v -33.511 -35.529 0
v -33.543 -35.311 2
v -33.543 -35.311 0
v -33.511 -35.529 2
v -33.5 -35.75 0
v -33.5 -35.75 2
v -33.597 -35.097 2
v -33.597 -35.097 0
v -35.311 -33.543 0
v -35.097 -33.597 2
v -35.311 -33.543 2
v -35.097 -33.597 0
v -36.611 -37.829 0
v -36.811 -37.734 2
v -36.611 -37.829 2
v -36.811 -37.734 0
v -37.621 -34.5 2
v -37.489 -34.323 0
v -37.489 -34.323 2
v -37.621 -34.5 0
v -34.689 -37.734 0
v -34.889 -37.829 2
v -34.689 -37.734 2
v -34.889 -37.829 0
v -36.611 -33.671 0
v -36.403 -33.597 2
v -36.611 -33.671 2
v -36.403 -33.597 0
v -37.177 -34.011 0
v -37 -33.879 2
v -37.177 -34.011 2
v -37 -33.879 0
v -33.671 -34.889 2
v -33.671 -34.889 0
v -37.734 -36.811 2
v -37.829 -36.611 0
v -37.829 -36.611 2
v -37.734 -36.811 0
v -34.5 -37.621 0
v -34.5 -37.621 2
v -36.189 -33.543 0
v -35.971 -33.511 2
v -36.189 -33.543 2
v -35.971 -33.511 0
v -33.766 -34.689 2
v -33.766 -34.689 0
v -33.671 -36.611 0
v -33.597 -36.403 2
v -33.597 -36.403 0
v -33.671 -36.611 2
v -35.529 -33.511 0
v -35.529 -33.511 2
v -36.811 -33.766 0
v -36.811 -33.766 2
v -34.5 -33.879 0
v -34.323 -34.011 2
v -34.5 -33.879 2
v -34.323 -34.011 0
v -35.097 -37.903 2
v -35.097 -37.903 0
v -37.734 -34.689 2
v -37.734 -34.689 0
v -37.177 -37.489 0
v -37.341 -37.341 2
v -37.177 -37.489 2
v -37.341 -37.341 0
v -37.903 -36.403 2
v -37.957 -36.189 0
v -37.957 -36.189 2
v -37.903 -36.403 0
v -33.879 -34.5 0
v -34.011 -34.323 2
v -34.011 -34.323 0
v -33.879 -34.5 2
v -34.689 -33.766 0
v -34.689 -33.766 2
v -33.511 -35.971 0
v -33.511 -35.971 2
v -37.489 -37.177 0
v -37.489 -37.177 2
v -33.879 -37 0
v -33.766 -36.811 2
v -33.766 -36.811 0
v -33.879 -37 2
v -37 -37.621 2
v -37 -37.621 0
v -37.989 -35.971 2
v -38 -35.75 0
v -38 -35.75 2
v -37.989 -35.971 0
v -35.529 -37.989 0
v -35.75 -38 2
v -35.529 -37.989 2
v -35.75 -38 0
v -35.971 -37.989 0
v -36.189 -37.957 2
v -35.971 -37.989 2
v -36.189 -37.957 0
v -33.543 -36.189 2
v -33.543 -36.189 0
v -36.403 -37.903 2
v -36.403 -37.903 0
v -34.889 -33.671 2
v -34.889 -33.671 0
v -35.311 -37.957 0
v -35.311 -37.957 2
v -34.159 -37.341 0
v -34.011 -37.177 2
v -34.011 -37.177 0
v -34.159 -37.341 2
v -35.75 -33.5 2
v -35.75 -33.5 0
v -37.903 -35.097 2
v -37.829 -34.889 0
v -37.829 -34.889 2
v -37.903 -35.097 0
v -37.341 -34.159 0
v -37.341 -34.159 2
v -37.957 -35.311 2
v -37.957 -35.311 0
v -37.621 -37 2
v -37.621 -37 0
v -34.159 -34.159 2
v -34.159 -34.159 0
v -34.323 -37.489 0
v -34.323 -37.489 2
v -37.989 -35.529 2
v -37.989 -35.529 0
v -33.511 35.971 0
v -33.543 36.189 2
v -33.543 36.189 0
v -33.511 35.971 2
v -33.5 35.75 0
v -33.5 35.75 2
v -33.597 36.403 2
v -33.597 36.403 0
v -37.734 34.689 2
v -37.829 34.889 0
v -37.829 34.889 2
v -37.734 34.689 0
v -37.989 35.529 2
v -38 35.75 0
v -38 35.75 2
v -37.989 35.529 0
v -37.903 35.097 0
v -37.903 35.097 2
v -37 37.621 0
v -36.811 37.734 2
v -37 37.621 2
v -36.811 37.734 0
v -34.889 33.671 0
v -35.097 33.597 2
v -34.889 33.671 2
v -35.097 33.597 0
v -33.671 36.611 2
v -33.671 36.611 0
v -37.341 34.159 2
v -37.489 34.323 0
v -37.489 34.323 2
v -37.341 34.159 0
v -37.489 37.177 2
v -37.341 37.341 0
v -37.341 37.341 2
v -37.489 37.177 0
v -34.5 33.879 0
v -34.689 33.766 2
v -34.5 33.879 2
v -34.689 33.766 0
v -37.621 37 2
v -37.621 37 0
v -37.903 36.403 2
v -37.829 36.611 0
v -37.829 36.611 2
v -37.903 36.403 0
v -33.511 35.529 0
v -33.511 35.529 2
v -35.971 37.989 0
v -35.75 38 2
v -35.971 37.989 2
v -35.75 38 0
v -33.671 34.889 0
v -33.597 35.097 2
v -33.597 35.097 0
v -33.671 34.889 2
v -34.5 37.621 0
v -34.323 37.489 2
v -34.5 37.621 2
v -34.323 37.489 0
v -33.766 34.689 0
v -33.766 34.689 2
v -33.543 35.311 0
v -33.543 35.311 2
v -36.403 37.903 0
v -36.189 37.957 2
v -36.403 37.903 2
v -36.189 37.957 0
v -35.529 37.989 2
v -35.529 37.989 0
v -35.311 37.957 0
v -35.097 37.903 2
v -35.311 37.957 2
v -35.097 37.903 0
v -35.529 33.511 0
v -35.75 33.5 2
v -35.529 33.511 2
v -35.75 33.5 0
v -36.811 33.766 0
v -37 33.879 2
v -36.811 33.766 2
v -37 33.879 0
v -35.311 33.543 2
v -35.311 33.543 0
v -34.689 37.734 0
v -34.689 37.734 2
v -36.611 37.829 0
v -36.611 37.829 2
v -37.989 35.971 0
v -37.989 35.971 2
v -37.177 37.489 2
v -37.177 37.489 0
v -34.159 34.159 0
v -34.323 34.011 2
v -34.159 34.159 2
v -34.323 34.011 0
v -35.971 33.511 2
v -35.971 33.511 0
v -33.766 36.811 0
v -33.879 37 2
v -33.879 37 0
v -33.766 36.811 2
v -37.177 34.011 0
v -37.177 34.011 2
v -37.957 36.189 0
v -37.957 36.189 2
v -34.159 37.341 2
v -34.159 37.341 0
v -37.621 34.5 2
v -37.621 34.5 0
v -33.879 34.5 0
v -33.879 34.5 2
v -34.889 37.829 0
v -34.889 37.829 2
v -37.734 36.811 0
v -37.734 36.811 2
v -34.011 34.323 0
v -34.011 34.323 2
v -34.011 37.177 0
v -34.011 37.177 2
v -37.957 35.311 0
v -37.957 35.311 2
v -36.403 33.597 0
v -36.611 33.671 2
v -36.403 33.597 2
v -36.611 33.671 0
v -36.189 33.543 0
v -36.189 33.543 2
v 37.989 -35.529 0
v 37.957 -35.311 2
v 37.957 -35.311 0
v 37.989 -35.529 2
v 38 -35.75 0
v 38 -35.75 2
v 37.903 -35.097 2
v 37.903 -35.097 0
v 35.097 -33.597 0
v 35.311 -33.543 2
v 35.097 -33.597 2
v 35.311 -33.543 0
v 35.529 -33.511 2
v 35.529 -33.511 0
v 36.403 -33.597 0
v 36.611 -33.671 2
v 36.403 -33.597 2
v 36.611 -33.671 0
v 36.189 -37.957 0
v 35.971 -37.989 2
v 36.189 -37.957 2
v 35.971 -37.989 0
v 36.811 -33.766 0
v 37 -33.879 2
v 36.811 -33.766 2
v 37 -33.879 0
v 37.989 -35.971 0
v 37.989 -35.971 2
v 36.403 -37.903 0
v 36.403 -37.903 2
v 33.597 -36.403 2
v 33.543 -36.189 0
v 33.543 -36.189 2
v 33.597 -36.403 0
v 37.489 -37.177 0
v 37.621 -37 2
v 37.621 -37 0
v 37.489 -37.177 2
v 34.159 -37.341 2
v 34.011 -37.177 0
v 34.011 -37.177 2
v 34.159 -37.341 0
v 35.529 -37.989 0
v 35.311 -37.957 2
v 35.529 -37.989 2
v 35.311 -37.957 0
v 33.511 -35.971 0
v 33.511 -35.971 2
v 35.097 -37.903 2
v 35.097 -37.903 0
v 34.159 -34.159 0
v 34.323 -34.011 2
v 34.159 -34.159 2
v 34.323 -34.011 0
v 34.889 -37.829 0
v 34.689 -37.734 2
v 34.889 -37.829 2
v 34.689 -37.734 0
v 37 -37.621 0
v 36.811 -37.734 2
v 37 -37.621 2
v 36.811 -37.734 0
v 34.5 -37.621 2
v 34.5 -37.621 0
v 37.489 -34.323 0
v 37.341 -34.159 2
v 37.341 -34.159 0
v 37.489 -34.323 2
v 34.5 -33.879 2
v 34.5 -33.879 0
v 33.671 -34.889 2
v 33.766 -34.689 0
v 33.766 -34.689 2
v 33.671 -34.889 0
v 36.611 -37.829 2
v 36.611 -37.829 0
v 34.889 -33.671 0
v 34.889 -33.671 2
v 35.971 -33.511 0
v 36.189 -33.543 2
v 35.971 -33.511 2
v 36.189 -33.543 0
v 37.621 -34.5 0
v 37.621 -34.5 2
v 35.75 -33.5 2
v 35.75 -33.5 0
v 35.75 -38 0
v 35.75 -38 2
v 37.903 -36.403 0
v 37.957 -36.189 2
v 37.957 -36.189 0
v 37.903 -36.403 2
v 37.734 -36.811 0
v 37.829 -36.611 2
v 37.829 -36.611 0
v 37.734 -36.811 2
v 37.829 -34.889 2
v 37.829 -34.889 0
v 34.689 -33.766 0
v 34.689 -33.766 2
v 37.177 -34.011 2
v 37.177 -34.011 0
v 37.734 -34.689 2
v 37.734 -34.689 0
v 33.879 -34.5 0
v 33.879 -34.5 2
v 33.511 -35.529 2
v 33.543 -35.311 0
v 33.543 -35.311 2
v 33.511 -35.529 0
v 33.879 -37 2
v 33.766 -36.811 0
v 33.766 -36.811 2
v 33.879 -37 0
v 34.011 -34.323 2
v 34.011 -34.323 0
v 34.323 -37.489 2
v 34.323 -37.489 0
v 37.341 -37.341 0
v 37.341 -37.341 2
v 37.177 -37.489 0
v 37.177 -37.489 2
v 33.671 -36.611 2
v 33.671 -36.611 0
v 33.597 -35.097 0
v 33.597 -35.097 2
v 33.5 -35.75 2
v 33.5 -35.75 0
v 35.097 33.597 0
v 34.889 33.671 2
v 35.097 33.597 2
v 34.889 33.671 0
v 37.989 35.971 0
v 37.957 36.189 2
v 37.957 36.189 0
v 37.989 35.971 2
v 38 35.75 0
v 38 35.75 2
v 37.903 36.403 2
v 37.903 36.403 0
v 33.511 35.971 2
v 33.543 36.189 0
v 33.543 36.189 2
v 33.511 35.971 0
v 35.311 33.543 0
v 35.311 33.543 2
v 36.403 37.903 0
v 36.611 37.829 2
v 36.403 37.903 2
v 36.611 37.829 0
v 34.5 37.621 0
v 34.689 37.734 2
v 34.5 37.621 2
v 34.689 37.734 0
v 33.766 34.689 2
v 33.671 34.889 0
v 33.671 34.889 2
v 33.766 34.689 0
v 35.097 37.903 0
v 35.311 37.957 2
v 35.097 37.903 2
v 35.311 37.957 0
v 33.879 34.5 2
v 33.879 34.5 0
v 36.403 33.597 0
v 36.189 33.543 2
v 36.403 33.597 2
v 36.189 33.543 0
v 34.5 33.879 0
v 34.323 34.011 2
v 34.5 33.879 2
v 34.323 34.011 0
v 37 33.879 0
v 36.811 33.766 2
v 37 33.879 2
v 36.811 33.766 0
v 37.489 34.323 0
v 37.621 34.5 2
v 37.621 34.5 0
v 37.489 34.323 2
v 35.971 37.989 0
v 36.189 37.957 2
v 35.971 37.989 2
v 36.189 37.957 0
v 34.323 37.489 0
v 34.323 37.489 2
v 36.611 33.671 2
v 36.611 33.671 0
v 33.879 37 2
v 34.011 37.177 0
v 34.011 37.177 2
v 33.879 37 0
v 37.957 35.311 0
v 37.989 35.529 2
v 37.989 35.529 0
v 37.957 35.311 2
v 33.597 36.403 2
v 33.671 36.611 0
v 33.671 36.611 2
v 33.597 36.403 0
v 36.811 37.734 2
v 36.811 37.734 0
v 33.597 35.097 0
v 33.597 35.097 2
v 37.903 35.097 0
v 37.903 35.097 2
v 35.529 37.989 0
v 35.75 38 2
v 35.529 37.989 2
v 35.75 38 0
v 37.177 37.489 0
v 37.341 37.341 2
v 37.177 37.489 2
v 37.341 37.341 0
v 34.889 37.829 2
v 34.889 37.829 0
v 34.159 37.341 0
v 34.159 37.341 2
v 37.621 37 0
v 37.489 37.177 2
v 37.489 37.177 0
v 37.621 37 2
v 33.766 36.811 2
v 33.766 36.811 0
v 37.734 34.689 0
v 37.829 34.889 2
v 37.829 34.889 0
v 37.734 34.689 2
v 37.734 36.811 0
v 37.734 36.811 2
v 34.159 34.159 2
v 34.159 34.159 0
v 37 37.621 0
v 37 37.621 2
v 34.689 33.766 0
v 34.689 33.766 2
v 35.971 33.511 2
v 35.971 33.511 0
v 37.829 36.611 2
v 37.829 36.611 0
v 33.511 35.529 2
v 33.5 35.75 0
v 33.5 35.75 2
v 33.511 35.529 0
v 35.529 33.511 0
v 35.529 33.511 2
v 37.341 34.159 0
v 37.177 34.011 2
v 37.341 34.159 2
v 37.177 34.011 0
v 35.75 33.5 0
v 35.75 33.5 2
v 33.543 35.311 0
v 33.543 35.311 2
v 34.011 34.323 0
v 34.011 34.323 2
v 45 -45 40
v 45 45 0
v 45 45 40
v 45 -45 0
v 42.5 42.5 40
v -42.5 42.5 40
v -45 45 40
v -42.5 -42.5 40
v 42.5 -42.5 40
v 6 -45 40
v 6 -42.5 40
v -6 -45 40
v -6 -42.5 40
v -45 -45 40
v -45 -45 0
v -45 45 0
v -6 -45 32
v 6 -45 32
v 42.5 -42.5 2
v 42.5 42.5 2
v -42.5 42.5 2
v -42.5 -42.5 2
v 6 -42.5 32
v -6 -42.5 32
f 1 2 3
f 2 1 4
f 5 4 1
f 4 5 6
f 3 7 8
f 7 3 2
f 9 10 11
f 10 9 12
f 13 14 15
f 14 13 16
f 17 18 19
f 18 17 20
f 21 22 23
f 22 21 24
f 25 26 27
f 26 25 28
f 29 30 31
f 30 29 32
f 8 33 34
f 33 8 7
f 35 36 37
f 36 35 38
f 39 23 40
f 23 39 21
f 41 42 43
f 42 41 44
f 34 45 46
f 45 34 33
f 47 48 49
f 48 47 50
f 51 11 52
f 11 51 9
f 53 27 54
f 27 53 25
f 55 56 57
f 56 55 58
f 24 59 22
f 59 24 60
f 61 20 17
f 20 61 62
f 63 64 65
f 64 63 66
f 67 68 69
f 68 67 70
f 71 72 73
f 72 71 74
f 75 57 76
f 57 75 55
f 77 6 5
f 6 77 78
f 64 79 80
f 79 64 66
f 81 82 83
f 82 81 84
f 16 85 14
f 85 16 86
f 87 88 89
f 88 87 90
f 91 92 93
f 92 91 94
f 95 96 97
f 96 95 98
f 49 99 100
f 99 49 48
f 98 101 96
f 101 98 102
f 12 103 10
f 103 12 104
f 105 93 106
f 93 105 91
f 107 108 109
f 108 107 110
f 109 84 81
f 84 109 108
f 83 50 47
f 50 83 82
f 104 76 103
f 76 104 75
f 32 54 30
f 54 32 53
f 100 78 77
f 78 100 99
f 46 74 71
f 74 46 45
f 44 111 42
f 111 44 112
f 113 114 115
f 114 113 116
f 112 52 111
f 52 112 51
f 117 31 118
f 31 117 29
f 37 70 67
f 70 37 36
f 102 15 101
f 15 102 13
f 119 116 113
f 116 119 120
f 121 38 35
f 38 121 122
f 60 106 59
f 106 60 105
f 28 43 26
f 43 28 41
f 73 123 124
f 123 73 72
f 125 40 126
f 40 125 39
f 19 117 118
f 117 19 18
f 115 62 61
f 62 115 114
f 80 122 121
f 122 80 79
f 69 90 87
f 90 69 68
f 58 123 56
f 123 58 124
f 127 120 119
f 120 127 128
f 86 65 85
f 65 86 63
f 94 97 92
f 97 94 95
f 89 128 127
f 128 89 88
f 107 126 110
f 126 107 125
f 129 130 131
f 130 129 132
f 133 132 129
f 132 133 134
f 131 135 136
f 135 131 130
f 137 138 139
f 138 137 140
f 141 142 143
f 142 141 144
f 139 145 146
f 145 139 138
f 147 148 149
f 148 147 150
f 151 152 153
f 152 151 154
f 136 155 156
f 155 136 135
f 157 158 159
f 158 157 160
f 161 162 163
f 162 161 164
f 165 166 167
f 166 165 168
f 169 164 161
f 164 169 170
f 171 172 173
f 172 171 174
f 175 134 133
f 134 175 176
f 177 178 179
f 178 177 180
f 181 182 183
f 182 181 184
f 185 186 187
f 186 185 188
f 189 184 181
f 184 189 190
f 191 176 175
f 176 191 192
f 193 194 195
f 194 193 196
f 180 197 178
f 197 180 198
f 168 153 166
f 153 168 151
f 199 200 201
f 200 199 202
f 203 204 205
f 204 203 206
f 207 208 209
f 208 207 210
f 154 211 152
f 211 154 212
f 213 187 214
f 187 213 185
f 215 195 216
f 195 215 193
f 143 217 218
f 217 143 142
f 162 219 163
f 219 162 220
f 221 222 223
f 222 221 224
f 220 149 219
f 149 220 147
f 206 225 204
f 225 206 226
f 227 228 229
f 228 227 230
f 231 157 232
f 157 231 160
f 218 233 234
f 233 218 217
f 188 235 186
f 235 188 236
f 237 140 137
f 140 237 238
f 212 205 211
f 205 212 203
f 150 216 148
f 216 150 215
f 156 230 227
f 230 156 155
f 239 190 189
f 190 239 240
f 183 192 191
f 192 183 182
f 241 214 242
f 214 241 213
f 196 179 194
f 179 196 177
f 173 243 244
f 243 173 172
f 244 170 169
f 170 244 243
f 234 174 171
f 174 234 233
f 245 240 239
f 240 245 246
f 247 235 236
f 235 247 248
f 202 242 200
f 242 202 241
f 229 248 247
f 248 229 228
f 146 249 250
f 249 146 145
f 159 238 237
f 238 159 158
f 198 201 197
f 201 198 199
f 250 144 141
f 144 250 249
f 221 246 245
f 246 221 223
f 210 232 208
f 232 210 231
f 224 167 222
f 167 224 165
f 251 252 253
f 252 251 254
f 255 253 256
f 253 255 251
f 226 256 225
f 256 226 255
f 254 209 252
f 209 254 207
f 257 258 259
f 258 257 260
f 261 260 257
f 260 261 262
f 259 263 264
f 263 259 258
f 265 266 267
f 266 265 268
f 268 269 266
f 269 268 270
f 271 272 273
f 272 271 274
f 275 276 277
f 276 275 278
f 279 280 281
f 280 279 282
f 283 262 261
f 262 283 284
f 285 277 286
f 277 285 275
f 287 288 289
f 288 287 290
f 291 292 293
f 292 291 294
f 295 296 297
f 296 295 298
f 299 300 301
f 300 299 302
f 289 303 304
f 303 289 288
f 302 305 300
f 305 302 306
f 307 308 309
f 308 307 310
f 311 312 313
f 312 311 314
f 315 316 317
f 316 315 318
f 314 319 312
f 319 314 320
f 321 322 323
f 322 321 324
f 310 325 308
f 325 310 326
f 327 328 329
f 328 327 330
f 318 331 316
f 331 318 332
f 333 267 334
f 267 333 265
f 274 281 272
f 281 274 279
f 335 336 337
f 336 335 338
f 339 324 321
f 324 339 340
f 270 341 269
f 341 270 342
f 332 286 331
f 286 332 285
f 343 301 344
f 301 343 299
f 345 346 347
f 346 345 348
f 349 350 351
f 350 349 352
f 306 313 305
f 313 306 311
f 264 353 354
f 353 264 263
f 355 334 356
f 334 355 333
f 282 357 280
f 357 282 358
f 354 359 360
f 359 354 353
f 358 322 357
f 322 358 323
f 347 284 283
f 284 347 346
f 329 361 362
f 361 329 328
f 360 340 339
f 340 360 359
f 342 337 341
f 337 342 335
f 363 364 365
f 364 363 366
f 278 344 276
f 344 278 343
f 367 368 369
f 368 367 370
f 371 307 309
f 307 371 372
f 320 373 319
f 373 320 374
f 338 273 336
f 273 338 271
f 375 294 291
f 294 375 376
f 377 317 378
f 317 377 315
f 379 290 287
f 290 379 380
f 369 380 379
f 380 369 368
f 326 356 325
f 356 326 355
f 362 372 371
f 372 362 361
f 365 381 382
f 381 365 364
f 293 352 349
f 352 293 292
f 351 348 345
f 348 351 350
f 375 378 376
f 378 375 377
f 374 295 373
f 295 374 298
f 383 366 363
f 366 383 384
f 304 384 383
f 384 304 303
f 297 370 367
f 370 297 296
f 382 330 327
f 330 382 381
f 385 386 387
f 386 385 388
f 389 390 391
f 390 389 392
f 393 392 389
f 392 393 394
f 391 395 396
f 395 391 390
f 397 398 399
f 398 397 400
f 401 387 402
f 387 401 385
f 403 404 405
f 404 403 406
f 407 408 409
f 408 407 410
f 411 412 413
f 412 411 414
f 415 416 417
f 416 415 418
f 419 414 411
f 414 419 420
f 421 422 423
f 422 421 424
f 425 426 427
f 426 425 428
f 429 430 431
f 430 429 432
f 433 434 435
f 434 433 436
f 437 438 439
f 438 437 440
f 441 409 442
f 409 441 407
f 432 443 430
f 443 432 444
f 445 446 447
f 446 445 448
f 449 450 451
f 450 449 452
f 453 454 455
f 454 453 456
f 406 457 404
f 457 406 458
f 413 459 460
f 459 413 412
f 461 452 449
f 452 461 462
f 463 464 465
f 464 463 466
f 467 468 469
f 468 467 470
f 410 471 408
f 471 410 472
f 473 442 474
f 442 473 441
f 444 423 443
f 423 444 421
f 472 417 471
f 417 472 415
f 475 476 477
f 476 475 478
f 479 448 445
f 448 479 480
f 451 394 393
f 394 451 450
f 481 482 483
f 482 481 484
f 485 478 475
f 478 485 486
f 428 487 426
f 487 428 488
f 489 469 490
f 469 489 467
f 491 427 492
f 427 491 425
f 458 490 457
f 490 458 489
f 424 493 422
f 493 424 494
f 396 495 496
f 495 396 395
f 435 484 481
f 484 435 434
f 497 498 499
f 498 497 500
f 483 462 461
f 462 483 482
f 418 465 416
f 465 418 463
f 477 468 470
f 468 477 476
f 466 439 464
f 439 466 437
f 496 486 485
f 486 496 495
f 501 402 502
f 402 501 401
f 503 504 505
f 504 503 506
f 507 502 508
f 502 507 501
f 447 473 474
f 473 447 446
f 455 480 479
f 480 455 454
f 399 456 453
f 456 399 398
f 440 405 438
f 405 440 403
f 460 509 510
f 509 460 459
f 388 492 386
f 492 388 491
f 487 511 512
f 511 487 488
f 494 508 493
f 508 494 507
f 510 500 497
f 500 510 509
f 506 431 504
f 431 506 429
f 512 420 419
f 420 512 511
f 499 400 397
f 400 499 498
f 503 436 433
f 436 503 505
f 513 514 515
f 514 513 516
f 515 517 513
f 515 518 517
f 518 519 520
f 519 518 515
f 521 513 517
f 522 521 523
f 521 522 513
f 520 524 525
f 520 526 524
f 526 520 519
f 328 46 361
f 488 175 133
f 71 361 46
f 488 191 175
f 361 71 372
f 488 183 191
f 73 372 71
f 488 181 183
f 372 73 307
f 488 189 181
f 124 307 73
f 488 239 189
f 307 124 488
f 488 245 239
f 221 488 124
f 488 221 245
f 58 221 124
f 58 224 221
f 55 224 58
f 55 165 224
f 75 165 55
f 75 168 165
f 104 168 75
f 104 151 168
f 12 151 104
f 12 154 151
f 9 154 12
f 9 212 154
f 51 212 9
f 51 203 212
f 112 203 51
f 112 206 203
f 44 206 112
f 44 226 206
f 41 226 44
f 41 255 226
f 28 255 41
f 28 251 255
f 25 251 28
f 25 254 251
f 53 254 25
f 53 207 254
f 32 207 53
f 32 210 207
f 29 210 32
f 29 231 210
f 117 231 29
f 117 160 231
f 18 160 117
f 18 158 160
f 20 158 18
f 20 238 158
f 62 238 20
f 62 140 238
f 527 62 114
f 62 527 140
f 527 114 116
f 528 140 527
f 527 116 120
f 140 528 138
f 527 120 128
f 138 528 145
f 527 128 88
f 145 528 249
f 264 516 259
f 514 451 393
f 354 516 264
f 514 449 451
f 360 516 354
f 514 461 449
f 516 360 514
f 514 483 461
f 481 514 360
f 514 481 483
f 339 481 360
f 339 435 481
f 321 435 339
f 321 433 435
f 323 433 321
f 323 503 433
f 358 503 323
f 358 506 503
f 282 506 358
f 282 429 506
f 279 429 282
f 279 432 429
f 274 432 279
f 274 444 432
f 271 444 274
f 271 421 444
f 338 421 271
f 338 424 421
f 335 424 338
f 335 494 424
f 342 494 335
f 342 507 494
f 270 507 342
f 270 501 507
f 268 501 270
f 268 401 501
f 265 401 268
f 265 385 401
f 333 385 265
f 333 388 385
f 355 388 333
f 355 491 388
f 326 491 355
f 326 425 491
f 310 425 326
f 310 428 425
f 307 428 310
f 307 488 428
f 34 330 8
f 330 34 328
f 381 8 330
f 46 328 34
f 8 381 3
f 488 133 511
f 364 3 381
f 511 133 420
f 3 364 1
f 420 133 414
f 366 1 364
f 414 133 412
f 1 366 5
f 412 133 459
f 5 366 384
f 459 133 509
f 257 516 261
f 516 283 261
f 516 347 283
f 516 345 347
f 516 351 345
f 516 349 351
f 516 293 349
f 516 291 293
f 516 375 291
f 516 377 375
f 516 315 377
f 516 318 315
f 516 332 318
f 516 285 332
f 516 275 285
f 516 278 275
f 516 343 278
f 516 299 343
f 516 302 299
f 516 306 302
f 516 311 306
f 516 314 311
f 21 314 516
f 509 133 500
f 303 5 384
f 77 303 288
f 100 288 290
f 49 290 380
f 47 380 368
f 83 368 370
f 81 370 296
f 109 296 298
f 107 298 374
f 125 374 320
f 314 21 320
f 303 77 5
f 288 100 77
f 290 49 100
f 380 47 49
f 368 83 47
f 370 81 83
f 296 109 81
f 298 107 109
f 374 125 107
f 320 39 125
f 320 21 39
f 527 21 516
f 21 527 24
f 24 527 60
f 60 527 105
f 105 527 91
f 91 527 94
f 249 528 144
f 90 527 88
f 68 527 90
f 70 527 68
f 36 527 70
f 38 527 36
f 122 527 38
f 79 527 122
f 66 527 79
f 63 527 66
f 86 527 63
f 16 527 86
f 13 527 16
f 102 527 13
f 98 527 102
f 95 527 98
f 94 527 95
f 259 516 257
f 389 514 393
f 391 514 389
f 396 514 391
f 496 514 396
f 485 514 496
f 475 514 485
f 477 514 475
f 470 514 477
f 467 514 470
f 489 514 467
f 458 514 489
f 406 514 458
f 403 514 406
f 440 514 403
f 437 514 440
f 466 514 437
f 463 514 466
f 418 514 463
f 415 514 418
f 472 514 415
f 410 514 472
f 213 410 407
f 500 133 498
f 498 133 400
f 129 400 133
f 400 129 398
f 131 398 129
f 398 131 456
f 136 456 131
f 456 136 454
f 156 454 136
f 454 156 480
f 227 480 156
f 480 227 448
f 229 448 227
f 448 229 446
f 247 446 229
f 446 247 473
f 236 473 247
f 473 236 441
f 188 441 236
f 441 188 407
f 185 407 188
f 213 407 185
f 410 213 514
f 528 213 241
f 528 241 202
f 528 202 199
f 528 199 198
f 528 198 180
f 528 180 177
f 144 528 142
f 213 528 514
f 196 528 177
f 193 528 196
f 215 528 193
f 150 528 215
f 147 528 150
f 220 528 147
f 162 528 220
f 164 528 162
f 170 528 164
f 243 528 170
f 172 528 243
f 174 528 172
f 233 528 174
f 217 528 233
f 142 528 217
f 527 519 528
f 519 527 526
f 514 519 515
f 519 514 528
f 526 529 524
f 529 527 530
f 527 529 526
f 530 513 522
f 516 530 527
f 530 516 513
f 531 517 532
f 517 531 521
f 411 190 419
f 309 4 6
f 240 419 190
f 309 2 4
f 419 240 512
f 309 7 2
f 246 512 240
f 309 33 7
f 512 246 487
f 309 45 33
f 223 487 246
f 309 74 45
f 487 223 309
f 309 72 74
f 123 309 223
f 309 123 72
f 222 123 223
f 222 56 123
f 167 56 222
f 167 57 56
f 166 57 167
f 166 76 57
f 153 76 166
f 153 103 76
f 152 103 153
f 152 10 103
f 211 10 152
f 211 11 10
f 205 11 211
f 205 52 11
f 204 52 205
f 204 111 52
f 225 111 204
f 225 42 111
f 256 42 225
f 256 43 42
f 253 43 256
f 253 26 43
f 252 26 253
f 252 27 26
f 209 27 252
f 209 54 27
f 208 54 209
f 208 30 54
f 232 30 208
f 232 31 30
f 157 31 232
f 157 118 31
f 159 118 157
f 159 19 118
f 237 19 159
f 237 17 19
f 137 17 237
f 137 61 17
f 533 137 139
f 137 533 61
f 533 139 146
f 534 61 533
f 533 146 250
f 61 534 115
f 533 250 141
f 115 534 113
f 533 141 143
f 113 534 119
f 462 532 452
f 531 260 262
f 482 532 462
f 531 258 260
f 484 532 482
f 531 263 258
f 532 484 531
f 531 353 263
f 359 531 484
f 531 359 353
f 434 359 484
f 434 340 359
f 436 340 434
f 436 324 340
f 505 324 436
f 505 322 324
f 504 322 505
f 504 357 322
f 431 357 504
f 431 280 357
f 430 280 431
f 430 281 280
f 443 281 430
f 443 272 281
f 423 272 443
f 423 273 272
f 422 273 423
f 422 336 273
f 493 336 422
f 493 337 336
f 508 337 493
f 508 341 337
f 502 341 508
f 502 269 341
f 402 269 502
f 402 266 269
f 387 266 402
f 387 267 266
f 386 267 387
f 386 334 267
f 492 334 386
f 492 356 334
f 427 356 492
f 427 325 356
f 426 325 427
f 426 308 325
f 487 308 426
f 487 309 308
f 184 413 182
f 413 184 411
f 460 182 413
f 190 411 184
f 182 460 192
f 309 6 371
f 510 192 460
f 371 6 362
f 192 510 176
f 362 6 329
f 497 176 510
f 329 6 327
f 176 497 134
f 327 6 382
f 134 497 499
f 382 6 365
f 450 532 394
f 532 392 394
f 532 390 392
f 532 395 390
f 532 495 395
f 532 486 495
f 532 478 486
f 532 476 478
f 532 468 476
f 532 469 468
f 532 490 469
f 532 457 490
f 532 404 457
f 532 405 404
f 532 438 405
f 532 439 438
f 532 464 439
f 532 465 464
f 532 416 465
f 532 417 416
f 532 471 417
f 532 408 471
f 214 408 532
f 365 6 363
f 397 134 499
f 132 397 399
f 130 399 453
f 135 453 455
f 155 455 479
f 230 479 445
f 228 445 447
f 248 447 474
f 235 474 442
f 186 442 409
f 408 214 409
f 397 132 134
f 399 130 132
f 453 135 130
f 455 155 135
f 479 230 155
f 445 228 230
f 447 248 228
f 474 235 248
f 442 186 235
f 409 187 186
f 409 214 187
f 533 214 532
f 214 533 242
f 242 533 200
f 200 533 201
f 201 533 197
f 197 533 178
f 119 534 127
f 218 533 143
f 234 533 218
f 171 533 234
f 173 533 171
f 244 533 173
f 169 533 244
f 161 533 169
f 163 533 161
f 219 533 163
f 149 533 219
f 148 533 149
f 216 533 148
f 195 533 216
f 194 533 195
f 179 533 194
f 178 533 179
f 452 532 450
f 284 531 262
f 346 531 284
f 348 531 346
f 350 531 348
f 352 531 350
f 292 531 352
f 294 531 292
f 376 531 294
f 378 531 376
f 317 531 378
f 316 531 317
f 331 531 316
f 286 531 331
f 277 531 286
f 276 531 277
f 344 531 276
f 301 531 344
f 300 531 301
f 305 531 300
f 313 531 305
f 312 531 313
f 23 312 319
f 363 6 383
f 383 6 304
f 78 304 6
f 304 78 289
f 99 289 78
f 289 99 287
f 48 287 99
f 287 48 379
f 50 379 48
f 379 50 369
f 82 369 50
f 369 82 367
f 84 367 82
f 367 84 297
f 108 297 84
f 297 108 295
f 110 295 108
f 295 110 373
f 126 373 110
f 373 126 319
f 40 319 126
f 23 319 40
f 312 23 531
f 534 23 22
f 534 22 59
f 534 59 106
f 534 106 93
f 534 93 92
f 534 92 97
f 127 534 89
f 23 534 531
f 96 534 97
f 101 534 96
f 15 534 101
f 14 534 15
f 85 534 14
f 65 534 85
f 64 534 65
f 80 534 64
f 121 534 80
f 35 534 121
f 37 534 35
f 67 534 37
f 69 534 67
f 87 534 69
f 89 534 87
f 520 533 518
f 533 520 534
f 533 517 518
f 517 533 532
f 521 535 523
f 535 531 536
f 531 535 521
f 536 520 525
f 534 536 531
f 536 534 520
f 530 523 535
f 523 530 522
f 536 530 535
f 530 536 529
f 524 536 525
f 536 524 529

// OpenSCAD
// DIY magnetic stirrer housing for 80 mm PC fan
// Print orientation: top plate (stirring surface) on bed, open side up

$fn = 64;

// --- Main dimensions ---
outer_x      = 90;    // outer size X
outer_y      = 90;    // outer size Y
height       = 40;    // total height (top plate + walls)
plate_t      = 2;     // top plate thickness (on bed, z=0..2)
wall_t       = 2.5;   // wall thickness

// --- Fan mounting holes ---
hole_d       = 4.5;   // M4 clearance hole diameter
hole_pitch   = 71.5;  // square pattern spacing (centre to centre)

// --- Cable notch ---
notch_w      = 12;    // notch width (along wall)
notch_depth  = 8;     // notch depth down from open edge (z=32..40)

eps = 0.5;            // cutting overlap

difference() {
    // Outer solid box
    translate([-outer_x/2, -outer_y/2, 0])
        cube([outer_x, outer_y, height]);

    // Inner cavity (open at top)
    translate([-(outer_x/2 - wall_t), -(outer_y/2 - wall_t), plate_t])
        cube([outer_x - 2*wall_t, outer_y - 2*wall_t, height - plate_t + eps]);

    // Four M4 mounting holes through the top plate
    for (sx = [-1, 1], sy = [-1, 1])
        translate([sx*hole_pitch/2, sy*hole_pitch/2, -eps])
            cylinder(d = hole_d, h = plate_t + 2*eps);

    // Cable notch in the -Y wall, centred along X
    translate([-notch_w/2, -outer_y/2 - eps, height - notch_depth])
        cube([notch_w, wall_t + 2*eps, notch_depth + eps]);
}
